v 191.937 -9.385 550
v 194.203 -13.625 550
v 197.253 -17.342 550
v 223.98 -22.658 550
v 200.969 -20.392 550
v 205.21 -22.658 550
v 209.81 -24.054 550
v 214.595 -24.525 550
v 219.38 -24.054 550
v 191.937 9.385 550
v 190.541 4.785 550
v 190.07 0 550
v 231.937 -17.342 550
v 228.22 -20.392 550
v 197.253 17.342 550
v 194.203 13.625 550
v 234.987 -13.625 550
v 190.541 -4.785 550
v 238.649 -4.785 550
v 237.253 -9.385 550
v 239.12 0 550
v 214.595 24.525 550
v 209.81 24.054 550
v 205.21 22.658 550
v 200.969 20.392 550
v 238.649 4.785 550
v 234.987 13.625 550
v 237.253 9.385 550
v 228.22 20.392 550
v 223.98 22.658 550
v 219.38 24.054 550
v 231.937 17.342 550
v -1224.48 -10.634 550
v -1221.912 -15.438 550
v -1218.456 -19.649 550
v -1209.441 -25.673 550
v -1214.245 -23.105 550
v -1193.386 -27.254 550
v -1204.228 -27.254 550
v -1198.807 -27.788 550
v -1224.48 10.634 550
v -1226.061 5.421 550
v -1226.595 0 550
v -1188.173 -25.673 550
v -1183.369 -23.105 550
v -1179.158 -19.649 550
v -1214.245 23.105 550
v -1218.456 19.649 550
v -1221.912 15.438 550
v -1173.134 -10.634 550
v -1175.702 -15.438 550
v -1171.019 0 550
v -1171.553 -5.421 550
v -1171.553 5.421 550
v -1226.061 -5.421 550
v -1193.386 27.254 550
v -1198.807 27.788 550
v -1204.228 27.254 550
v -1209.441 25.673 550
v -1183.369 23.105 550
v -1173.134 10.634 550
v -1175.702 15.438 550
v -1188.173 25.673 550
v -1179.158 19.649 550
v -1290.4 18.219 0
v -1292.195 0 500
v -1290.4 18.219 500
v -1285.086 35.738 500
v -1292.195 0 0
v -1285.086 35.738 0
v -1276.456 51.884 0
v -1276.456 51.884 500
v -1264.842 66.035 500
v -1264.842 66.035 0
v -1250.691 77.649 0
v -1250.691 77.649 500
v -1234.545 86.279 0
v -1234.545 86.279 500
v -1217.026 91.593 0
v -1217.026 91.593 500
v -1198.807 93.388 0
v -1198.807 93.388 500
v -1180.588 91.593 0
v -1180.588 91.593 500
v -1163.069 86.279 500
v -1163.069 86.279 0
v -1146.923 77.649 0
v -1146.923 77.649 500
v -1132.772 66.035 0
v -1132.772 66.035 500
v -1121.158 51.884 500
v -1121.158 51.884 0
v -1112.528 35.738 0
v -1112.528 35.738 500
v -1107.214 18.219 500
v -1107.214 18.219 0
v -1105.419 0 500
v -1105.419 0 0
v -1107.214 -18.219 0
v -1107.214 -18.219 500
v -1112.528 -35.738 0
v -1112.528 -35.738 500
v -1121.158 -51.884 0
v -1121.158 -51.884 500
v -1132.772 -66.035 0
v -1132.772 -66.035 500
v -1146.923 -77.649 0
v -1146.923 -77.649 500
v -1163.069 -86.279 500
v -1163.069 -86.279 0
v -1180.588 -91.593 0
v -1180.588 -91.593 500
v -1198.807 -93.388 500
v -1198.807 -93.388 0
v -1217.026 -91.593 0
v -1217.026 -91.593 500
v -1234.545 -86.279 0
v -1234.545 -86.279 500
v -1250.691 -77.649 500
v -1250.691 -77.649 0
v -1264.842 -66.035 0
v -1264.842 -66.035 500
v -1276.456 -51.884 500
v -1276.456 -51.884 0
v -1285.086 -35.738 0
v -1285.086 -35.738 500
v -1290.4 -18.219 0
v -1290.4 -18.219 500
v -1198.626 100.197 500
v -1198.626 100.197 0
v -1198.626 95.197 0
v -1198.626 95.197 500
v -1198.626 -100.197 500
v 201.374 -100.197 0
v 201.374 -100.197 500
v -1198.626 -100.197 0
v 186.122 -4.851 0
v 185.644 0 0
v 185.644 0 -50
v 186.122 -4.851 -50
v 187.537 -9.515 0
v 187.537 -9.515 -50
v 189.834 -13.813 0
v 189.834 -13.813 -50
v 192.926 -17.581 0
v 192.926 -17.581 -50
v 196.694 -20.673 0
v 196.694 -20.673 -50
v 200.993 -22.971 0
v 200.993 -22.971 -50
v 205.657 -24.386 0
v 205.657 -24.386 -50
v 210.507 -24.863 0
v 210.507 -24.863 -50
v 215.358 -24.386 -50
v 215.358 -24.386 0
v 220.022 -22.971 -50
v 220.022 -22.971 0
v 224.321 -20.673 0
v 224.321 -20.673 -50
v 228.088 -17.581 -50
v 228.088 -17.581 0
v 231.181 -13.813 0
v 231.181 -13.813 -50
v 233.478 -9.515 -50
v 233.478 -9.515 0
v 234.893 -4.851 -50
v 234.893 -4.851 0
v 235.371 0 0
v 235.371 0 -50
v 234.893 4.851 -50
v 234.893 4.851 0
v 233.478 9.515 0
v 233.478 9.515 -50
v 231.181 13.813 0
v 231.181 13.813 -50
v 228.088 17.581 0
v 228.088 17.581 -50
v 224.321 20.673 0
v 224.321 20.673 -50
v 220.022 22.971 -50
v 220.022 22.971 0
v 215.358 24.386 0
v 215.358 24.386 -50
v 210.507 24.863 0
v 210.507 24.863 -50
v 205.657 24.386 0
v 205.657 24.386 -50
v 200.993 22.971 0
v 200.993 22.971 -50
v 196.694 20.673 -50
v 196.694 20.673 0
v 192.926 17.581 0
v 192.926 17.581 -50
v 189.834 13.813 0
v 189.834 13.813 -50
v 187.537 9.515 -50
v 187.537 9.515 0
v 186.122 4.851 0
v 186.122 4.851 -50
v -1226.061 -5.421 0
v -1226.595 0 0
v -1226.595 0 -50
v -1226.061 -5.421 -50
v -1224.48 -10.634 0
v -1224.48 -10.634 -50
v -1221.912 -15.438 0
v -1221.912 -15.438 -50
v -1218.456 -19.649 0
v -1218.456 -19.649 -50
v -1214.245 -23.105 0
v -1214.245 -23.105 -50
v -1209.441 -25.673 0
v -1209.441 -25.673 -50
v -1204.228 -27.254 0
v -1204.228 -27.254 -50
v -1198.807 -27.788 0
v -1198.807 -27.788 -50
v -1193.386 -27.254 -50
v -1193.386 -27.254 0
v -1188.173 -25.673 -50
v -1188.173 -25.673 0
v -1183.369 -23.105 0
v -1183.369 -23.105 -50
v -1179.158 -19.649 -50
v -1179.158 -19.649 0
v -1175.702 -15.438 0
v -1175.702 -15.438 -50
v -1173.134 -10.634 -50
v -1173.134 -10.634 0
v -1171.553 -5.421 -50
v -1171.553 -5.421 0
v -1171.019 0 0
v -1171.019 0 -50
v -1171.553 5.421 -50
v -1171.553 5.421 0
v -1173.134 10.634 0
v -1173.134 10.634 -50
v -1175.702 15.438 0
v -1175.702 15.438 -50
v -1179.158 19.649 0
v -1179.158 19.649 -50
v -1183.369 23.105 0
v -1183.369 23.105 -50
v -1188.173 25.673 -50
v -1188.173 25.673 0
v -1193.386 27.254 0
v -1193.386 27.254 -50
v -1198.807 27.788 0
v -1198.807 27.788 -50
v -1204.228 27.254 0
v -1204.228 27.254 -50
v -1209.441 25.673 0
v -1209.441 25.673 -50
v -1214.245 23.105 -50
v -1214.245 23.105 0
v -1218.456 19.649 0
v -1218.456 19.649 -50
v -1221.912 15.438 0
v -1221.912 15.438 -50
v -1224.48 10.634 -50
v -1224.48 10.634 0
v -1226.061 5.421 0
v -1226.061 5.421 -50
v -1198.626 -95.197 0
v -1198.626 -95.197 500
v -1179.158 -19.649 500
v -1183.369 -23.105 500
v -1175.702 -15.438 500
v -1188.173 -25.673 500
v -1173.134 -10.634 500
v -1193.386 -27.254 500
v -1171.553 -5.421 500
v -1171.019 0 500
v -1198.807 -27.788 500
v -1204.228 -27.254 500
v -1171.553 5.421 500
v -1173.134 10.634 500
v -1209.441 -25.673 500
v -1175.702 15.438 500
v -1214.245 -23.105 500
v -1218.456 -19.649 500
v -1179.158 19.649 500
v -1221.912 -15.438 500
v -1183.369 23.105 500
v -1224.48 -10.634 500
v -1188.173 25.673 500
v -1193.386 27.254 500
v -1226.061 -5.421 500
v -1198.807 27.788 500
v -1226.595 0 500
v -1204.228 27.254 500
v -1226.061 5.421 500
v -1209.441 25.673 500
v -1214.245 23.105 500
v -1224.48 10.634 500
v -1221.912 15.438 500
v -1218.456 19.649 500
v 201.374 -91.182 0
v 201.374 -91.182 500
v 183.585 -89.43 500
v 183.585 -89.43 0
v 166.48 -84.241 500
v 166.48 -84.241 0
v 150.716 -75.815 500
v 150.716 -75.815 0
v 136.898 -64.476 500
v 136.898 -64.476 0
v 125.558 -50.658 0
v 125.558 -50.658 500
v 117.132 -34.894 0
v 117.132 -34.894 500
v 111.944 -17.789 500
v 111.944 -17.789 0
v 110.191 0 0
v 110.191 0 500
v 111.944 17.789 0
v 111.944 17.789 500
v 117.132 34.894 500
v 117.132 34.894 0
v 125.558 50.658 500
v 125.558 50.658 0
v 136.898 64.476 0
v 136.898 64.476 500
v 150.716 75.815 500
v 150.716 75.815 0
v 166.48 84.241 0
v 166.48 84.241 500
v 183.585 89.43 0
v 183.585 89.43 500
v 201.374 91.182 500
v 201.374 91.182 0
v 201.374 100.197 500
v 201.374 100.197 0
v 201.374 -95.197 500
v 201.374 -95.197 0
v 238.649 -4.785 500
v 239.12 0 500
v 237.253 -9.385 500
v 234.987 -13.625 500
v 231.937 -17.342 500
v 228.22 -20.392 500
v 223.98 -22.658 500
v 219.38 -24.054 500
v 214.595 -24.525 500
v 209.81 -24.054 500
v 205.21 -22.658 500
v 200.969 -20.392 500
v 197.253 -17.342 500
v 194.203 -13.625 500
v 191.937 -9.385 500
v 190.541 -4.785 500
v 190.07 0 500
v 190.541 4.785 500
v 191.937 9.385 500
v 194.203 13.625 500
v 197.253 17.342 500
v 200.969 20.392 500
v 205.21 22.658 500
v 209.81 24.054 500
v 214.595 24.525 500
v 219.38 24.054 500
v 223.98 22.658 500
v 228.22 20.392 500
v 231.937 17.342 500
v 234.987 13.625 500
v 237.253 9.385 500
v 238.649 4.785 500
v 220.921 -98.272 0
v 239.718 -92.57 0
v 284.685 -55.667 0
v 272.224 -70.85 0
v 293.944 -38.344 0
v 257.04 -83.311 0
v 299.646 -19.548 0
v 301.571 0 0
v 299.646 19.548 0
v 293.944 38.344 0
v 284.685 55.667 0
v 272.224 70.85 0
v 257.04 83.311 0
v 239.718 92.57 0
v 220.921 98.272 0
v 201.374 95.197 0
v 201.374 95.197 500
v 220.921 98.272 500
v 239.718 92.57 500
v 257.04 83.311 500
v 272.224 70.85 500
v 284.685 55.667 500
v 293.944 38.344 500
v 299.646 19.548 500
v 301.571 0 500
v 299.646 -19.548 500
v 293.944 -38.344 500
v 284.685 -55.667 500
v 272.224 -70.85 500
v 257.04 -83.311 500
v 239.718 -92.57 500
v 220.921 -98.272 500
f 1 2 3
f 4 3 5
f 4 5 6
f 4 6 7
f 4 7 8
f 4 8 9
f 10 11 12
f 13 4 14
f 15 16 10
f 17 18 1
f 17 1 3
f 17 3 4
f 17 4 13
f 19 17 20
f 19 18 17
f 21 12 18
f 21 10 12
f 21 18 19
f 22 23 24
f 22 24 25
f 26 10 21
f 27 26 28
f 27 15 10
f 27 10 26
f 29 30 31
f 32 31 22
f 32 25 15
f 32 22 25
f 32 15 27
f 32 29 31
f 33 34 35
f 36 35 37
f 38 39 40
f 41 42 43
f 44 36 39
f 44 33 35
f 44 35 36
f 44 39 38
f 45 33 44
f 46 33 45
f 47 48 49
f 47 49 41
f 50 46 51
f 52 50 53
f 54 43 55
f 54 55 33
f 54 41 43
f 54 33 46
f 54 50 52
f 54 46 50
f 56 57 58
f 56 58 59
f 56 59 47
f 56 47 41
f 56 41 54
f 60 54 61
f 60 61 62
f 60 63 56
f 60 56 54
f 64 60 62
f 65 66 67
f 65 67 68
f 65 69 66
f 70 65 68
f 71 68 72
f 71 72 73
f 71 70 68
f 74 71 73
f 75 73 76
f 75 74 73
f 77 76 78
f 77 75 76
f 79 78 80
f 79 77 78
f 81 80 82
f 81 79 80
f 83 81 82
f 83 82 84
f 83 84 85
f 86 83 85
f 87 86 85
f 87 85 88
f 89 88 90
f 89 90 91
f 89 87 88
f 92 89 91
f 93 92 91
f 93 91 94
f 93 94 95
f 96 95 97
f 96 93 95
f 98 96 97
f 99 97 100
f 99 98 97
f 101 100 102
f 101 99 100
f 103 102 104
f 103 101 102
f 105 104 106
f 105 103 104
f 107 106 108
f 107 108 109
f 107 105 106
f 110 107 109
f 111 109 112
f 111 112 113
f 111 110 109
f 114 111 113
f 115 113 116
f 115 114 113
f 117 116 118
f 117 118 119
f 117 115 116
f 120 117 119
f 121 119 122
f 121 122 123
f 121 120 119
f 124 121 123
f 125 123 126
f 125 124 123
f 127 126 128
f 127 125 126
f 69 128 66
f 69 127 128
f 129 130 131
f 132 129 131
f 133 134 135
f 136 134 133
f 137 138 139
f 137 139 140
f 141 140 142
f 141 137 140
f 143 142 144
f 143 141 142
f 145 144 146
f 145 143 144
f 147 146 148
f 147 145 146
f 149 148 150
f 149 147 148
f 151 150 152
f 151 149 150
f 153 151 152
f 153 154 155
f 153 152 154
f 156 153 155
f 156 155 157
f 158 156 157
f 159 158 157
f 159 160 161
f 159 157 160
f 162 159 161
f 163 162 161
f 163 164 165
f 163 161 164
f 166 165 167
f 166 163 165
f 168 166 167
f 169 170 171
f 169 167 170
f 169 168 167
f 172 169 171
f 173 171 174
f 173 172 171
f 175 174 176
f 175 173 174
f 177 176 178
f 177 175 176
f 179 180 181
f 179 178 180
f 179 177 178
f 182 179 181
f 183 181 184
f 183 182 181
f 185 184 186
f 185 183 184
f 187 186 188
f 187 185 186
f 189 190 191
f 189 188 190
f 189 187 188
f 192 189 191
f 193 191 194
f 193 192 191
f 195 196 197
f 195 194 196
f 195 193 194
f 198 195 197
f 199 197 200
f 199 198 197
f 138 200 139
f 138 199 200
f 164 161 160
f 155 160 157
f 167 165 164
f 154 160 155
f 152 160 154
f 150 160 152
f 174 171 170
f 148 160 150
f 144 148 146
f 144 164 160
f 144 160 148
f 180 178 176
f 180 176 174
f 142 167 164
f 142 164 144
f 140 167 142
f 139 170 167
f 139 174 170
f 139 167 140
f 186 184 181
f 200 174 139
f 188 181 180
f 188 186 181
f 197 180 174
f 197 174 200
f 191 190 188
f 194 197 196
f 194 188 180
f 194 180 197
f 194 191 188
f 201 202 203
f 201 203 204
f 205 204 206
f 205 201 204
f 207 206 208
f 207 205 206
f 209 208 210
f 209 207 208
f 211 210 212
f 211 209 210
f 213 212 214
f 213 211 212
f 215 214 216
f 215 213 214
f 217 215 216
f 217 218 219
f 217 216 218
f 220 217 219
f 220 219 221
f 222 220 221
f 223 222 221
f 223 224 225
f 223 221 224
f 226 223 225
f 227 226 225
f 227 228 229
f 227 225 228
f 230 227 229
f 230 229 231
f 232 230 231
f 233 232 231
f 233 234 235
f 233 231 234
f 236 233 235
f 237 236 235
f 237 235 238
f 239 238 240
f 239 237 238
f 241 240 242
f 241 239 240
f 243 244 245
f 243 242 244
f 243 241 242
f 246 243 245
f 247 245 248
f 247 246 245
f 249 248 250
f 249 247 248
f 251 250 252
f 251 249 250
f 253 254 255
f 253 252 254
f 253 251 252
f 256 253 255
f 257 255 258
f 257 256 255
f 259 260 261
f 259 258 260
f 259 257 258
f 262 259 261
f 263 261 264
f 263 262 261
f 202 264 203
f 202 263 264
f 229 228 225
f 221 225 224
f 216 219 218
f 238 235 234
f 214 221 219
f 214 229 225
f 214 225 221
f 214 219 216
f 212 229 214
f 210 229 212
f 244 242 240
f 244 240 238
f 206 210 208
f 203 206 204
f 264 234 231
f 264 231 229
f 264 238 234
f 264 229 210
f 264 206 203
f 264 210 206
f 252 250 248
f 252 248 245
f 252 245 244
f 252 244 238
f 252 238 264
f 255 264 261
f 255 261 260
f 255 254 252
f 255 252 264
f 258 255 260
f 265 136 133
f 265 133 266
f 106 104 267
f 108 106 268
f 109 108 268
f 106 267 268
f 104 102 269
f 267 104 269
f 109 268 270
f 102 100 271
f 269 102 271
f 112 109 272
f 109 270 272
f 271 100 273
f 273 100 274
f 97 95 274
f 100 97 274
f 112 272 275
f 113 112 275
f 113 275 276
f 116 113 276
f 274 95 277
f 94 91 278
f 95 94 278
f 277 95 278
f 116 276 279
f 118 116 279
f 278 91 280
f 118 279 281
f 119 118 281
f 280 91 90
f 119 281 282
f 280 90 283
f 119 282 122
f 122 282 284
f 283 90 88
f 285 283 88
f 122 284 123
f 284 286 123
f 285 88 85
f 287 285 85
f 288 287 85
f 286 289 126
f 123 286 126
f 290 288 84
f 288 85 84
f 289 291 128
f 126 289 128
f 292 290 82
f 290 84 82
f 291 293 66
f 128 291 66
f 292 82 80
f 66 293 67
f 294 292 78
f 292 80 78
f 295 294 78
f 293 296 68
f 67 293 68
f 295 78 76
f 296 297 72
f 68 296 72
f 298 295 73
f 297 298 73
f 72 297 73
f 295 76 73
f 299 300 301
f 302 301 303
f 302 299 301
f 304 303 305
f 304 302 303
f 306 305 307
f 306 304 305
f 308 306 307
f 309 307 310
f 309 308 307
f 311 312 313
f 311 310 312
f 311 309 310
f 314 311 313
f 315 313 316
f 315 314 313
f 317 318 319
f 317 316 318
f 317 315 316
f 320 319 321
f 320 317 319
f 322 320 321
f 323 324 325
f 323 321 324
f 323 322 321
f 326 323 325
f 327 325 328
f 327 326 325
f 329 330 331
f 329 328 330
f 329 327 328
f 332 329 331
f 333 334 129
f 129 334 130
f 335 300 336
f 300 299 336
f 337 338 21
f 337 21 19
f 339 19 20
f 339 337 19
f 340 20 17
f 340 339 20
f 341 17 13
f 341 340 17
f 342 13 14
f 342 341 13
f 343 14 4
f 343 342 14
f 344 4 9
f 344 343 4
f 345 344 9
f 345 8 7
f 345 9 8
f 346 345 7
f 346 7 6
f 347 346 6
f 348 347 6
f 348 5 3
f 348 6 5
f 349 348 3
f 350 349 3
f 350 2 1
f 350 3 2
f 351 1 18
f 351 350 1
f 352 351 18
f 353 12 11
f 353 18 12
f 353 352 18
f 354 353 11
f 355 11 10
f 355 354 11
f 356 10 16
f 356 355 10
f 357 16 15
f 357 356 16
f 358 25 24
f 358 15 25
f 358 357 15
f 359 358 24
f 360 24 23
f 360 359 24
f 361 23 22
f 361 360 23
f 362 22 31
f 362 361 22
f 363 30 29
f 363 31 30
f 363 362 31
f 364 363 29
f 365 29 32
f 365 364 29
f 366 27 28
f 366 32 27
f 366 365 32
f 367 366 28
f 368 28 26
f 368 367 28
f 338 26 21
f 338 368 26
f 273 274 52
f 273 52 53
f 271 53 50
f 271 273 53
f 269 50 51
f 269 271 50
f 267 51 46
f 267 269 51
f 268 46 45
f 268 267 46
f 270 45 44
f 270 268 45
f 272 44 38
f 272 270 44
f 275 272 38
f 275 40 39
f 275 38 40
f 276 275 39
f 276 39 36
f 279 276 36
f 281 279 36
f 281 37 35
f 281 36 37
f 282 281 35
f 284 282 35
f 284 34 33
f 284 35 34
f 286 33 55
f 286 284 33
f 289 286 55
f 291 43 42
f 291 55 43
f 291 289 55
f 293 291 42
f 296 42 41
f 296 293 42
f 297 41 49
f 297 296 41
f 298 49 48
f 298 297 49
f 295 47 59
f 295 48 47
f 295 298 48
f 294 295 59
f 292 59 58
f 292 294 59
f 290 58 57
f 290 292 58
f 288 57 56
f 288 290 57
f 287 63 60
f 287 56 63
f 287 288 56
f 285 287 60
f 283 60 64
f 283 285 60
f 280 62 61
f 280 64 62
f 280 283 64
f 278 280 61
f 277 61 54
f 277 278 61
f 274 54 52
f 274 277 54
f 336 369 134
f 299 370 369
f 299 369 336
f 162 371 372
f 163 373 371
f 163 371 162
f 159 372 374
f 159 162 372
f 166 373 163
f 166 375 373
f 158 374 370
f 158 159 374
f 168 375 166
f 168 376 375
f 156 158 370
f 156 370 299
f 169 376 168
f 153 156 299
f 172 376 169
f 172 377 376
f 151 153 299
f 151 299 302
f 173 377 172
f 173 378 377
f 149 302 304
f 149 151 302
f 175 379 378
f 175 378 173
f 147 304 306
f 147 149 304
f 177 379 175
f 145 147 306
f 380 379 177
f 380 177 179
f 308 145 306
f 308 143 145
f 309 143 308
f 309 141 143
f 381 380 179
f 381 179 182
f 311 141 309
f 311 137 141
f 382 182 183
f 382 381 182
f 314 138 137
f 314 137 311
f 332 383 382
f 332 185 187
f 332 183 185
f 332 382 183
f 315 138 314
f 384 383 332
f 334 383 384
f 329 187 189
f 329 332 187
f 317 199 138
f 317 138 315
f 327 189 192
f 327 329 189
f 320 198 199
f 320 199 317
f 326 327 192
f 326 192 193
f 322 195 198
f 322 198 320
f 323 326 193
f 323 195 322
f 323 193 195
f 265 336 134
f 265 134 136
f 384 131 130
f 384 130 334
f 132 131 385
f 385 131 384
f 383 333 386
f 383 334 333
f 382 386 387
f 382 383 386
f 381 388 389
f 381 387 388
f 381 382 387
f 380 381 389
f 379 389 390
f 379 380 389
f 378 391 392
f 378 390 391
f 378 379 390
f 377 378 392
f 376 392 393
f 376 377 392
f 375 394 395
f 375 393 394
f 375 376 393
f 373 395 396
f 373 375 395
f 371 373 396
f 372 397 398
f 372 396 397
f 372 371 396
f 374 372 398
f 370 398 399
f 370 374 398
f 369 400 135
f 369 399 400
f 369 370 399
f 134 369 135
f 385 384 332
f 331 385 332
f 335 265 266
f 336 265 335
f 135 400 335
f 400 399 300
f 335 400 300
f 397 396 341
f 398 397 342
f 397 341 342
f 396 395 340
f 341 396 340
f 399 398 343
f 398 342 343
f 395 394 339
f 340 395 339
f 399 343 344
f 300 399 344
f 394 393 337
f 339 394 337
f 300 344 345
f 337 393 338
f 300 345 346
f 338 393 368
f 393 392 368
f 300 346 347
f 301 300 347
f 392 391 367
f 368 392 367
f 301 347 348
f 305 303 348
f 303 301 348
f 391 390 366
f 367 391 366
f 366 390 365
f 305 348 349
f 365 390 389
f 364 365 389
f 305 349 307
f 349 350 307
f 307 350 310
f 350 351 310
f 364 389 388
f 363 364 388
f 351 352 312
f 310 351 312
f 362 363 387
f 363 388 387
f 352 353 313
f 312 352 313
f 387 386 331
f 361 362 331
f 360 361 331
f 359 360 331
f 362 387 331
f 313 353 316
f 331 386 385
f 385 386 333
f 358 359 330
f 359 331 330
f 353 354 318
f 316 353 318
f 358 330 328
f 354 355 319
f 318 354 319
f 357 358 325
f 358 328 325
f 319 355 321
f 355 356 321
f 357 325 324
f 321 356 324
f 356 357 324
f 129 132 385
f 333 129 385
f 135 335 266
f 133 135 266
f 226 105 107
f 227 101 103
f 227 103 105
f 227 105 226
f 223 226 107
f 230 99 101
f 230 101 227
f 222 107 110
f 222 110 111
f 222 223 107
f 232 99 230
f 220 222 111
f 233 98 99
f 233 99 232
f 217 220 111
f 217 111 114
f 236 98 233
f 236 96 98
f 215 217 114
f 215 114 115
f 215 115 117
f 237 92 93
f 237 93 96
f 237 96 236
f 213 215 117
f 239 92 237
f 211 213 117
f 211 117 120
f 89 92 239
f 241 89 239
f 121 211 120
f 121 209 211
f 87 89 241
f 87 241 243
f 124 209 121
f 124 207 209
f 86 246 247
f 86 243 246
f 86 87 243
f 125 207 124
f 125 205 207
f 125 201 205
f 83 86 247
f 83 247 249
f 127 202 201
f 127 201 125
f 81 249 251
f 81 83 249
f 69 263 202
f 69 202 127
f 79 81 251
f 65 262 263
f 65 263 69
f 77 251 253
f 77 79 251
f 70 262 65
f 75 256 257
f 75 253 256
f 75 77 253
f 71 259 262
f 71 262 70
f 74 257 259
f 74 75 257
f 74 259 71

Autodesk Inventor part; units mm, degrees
ref_plane "YZ Plane" through (0, 0, 0) normal (1, 0, 0) x (0, 1, 0)
ref_plane "XZ Plane" through (0, 0, 0) normal (0, 1, 0) x (-1, 0, 0)
ref_plane "XY Plane" through (0, 0, 0) normal (0, 0, 1) x (1, 0, 0)
sketch "Sketch1" plane through (0, 0, 0) normal (0, 0, 1) x (1, 0, 0)
  arc A0 (201.3738, -100.1974) -> (201.3738, 100.1974) centre (201.3738, 0) ccw
  line L0 (201.3738, 100.1974) -> (201.3738, -100.1974)
  point P0 (0, 0)
extrude "Extrusion1" add sketch "Sketch1" along normal blind 500
sketch "Sketch2" plane through (0, 0, 0) normal (0, 0, -1) x (-1, 0, 0)
  arc A0 (-201.3738, 100.1974) -> (-201.3738, -100.1974) centre (-201.3738, 0) ccw projected
  line L0 (-201.3738, 100.1974) -> (1198.6262, 100.1974)
  line L1 (1198.6262, 100.1974) -> (1198.6262, 95.1974)
  line L2 (1198.6262, 95.1974) -> (-201.3738, 95.1974)
  line L3 (-201.3738, 95.1974) -> (-201.3738, 100.1974)
  line L4 (-201.3738, -100.1974) -> (1198.6262, -100.1974)
  line L5 (1198.6262, -100.1974) -> (1198.6262, -93.0586)
  line L6 (1198.6262, -93.0586) -> (-201.3738, -93.0586)
  line L7 (-201.3738, -93.0586) -> (-201.3738, -100.1974)
  circle A1 centre (-201.3738, 0) radius 93.8222
  point P0 (0, 0)
  dimension "d2" = 1400
  dimension "d3" = 5
  dimension "d4" = 1400
extrude "Extrusion2" add sketch "Sketch2" against normal blind 500 contours L0 L1 L2 L3
sketch "Sketch3" plane through (0, 0, 0) normal (0, 0, -1) x (-1, 0, 0)
  point P0 (0, 0)
sketch "Sketch4" plane through (0, 0, 0) normal (0, 0, -1) x (-1, 0, 0)
  arc A0 (-201.3738, 100.1974) -> (-201.3738, -100.1974) centre (-201.3738, 0) ccw projected
  line L0 (-201.3738, -100.1974) -> (1198.6262, -100.1974)
  line L1 (1198.6262, -100.1974) -> (1198.6262, -95.1974)
  line L2 (1198.6262, -95.1974) -> (-201.3738, -95.1974)
  line L3 (-201.3738, -95.1974) -> (-201.3738, -100.1974)
  point P0 (0, 0)
  dimension "d7" = 1400
  dimension "d8" = 5
extrude "Extrusion3" add sketch "Sketch4" against normal blind 500
sketch "Sketch5" plane through (0, 0, 0) normal (0, 0, -1) x (-1, 0, 0)
  line L0 (-201.3738, -95.1974) -> (-201.3738, 95.1974) projected
  circle A0 centre (-201.3738, 0) radius 91.1823
  point P0 (0, 0)
extrude "Extrusion4" add sketch "Sketch5" against normal blind 500
sketch "Sketch6" plane through (0, 0, 0) normal (0, 0, -1) x (-1, 0, 0)
  circle A0 centre (1198.807, 0) radius 93.3879
  point P0 (0, 0)
extrude "Extrusion5" add sketch "Sketch6" against normal blind 500
sketch "Sketch7" plane through (-1198.807, 0, 0) normal (0, 0, -1) x (-1, 0, 0)
  circle A0 centre (0, 0) radius 27.7879
  point P0 (-1198.807, 0)
extrude "Extrusion6" add sketch "Sketch7" along normal blind 50
sketch "Sketch8" plane through (-1198.807, 0, 500) normal (0, 0, 1) x (1, 0, 0)
  circle A0 centre (0, 0) radius 27.7879
  point P0 (1198.807, 0)
extrude "Extrusion7" add sketch "Sketch8" along normal blind 50
sketch "Sketch9" plane through (0, 0, 500) normal (0, 0, 1) x (1, 0, 0)
  circle A0 centre (214.5949, 0) radius 24.5251
  point P0 (0, 0)
extrude "Extrusion8" add sketch "Sketch9" along normal blind 50
sketch "Sketch10" plane through (0, 0, 0) normal (0, 0, -1) x (-1, 0, 0)
  circle A0 centre (-210.5074, 0) radius 24.8634
  point P0 (0, 0)
extrude "Extrusion9" add sketch "Sketch10" along normal blind 50
equation "\"BendRadius\" = Thickness"
equation "\"BendReliefWidth\" = Thickness"
equation "\"BendReliefDepth\" = 0.5 * Thickness"
equation "\"CornerReliefSize\" = 4 * Thickness"
equation "\"MinimumRemnant\" = 2 * Thickness"
equation "\"TransitionRadius\" = BendRadius"
equation "\"JacobiRadiusSize\" = BendRadius"
equation "\"GapSize\" = Thickness"
equation "\"Thickness\" = 3.048"
properties part number "new part ee.2"
